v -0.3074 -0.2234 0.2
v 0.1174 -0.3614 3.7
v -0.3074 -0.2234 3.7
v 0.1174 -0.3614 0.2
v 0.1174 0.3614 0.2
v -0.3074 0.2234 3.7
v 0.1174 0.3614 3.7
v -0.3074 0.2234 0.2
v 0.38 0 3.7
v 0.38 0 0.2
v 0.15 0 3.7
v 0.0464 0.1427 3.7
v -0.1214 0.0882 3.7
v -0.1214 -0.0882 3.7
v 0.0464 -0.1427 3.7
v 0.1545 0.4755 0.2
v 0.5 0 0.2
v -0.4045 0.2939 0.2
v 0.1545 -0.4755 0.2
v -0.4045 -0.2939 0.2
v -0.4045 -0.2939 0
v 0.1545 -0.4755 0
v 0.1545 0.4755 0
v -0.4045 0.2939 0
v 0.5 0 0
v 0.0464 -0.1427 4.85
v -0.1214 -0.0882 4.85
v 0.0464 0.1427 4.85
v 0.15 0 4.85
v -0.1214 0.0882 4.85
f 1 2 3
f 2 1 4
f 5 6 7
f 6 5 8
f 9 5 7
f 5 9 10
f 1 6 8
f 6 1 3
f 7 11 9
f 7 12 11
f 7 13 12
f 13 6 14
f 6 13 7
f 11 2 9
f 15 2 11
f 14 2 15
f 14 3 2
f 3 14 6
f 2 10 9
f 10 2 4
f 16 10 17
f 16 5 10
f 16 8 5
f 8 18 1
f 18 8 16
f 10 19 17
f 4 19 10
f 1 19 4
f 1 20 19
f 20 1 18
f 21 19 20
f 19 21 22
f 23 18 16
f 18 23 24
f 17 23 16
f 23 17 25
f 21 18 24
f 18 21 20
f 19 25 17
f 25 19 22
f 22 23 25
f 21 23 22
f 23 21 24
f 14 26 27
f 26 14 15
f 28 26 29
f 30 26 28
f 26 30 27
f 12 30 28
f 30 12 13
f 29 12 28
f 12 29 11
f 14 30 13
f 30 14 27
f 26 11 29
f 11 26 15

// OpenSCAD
// Parameters
body_diameter_mm = 0.76; //[0.38:1.52:0.01]
overall_height_mm = 4.7; //[2.35:9.4:0.05]
body_height_mm = 3.5; //[1.75:7:0.05]
lever_height_mm = 1.2; //[0.6:2.4:0.05]
lever_diameter_mm = 0.3; //[0.15:0.6:0.01]
base_flange_diameter_mm = 1; //[0.5:2:0.01]
base_flange_thickness_mm = 0.2; //[0.1:0.4:0.01]
overlap_mm = 0.05; //[0.02:0.2:0.01]

// Toggle switch - complete geometry
module toggle() {
  union() {
    // Cylindrical Body
    color("DimGray") {
      translate([0, 0, base_flange_thickness_mm + body_height_mm / 2])
        cylinder(r=body_diameter_mm / 2, h=body_height_mm, center=true);
    }
    // Base Flange
    color("Silver") {
      translate([0, 0, base_flange_thickness_mm / 2])
        cylinder(r=base_flange_diameter_mm / 2, h=base_flange_thickness_mm, center=true);
    }
    // Actuator Lever
    color("Black") {
      translate([0, 0, base_flange_thickness_mm + body_height_mm + lever_height_mm / 2 - overlap_mm])
        cylinder(r=lever_diameter_mm / 2, h=lever_height_mm, center=true);
    }
  }
}

// Assembly
module assembly() {
  toggle();
}

assembly();
